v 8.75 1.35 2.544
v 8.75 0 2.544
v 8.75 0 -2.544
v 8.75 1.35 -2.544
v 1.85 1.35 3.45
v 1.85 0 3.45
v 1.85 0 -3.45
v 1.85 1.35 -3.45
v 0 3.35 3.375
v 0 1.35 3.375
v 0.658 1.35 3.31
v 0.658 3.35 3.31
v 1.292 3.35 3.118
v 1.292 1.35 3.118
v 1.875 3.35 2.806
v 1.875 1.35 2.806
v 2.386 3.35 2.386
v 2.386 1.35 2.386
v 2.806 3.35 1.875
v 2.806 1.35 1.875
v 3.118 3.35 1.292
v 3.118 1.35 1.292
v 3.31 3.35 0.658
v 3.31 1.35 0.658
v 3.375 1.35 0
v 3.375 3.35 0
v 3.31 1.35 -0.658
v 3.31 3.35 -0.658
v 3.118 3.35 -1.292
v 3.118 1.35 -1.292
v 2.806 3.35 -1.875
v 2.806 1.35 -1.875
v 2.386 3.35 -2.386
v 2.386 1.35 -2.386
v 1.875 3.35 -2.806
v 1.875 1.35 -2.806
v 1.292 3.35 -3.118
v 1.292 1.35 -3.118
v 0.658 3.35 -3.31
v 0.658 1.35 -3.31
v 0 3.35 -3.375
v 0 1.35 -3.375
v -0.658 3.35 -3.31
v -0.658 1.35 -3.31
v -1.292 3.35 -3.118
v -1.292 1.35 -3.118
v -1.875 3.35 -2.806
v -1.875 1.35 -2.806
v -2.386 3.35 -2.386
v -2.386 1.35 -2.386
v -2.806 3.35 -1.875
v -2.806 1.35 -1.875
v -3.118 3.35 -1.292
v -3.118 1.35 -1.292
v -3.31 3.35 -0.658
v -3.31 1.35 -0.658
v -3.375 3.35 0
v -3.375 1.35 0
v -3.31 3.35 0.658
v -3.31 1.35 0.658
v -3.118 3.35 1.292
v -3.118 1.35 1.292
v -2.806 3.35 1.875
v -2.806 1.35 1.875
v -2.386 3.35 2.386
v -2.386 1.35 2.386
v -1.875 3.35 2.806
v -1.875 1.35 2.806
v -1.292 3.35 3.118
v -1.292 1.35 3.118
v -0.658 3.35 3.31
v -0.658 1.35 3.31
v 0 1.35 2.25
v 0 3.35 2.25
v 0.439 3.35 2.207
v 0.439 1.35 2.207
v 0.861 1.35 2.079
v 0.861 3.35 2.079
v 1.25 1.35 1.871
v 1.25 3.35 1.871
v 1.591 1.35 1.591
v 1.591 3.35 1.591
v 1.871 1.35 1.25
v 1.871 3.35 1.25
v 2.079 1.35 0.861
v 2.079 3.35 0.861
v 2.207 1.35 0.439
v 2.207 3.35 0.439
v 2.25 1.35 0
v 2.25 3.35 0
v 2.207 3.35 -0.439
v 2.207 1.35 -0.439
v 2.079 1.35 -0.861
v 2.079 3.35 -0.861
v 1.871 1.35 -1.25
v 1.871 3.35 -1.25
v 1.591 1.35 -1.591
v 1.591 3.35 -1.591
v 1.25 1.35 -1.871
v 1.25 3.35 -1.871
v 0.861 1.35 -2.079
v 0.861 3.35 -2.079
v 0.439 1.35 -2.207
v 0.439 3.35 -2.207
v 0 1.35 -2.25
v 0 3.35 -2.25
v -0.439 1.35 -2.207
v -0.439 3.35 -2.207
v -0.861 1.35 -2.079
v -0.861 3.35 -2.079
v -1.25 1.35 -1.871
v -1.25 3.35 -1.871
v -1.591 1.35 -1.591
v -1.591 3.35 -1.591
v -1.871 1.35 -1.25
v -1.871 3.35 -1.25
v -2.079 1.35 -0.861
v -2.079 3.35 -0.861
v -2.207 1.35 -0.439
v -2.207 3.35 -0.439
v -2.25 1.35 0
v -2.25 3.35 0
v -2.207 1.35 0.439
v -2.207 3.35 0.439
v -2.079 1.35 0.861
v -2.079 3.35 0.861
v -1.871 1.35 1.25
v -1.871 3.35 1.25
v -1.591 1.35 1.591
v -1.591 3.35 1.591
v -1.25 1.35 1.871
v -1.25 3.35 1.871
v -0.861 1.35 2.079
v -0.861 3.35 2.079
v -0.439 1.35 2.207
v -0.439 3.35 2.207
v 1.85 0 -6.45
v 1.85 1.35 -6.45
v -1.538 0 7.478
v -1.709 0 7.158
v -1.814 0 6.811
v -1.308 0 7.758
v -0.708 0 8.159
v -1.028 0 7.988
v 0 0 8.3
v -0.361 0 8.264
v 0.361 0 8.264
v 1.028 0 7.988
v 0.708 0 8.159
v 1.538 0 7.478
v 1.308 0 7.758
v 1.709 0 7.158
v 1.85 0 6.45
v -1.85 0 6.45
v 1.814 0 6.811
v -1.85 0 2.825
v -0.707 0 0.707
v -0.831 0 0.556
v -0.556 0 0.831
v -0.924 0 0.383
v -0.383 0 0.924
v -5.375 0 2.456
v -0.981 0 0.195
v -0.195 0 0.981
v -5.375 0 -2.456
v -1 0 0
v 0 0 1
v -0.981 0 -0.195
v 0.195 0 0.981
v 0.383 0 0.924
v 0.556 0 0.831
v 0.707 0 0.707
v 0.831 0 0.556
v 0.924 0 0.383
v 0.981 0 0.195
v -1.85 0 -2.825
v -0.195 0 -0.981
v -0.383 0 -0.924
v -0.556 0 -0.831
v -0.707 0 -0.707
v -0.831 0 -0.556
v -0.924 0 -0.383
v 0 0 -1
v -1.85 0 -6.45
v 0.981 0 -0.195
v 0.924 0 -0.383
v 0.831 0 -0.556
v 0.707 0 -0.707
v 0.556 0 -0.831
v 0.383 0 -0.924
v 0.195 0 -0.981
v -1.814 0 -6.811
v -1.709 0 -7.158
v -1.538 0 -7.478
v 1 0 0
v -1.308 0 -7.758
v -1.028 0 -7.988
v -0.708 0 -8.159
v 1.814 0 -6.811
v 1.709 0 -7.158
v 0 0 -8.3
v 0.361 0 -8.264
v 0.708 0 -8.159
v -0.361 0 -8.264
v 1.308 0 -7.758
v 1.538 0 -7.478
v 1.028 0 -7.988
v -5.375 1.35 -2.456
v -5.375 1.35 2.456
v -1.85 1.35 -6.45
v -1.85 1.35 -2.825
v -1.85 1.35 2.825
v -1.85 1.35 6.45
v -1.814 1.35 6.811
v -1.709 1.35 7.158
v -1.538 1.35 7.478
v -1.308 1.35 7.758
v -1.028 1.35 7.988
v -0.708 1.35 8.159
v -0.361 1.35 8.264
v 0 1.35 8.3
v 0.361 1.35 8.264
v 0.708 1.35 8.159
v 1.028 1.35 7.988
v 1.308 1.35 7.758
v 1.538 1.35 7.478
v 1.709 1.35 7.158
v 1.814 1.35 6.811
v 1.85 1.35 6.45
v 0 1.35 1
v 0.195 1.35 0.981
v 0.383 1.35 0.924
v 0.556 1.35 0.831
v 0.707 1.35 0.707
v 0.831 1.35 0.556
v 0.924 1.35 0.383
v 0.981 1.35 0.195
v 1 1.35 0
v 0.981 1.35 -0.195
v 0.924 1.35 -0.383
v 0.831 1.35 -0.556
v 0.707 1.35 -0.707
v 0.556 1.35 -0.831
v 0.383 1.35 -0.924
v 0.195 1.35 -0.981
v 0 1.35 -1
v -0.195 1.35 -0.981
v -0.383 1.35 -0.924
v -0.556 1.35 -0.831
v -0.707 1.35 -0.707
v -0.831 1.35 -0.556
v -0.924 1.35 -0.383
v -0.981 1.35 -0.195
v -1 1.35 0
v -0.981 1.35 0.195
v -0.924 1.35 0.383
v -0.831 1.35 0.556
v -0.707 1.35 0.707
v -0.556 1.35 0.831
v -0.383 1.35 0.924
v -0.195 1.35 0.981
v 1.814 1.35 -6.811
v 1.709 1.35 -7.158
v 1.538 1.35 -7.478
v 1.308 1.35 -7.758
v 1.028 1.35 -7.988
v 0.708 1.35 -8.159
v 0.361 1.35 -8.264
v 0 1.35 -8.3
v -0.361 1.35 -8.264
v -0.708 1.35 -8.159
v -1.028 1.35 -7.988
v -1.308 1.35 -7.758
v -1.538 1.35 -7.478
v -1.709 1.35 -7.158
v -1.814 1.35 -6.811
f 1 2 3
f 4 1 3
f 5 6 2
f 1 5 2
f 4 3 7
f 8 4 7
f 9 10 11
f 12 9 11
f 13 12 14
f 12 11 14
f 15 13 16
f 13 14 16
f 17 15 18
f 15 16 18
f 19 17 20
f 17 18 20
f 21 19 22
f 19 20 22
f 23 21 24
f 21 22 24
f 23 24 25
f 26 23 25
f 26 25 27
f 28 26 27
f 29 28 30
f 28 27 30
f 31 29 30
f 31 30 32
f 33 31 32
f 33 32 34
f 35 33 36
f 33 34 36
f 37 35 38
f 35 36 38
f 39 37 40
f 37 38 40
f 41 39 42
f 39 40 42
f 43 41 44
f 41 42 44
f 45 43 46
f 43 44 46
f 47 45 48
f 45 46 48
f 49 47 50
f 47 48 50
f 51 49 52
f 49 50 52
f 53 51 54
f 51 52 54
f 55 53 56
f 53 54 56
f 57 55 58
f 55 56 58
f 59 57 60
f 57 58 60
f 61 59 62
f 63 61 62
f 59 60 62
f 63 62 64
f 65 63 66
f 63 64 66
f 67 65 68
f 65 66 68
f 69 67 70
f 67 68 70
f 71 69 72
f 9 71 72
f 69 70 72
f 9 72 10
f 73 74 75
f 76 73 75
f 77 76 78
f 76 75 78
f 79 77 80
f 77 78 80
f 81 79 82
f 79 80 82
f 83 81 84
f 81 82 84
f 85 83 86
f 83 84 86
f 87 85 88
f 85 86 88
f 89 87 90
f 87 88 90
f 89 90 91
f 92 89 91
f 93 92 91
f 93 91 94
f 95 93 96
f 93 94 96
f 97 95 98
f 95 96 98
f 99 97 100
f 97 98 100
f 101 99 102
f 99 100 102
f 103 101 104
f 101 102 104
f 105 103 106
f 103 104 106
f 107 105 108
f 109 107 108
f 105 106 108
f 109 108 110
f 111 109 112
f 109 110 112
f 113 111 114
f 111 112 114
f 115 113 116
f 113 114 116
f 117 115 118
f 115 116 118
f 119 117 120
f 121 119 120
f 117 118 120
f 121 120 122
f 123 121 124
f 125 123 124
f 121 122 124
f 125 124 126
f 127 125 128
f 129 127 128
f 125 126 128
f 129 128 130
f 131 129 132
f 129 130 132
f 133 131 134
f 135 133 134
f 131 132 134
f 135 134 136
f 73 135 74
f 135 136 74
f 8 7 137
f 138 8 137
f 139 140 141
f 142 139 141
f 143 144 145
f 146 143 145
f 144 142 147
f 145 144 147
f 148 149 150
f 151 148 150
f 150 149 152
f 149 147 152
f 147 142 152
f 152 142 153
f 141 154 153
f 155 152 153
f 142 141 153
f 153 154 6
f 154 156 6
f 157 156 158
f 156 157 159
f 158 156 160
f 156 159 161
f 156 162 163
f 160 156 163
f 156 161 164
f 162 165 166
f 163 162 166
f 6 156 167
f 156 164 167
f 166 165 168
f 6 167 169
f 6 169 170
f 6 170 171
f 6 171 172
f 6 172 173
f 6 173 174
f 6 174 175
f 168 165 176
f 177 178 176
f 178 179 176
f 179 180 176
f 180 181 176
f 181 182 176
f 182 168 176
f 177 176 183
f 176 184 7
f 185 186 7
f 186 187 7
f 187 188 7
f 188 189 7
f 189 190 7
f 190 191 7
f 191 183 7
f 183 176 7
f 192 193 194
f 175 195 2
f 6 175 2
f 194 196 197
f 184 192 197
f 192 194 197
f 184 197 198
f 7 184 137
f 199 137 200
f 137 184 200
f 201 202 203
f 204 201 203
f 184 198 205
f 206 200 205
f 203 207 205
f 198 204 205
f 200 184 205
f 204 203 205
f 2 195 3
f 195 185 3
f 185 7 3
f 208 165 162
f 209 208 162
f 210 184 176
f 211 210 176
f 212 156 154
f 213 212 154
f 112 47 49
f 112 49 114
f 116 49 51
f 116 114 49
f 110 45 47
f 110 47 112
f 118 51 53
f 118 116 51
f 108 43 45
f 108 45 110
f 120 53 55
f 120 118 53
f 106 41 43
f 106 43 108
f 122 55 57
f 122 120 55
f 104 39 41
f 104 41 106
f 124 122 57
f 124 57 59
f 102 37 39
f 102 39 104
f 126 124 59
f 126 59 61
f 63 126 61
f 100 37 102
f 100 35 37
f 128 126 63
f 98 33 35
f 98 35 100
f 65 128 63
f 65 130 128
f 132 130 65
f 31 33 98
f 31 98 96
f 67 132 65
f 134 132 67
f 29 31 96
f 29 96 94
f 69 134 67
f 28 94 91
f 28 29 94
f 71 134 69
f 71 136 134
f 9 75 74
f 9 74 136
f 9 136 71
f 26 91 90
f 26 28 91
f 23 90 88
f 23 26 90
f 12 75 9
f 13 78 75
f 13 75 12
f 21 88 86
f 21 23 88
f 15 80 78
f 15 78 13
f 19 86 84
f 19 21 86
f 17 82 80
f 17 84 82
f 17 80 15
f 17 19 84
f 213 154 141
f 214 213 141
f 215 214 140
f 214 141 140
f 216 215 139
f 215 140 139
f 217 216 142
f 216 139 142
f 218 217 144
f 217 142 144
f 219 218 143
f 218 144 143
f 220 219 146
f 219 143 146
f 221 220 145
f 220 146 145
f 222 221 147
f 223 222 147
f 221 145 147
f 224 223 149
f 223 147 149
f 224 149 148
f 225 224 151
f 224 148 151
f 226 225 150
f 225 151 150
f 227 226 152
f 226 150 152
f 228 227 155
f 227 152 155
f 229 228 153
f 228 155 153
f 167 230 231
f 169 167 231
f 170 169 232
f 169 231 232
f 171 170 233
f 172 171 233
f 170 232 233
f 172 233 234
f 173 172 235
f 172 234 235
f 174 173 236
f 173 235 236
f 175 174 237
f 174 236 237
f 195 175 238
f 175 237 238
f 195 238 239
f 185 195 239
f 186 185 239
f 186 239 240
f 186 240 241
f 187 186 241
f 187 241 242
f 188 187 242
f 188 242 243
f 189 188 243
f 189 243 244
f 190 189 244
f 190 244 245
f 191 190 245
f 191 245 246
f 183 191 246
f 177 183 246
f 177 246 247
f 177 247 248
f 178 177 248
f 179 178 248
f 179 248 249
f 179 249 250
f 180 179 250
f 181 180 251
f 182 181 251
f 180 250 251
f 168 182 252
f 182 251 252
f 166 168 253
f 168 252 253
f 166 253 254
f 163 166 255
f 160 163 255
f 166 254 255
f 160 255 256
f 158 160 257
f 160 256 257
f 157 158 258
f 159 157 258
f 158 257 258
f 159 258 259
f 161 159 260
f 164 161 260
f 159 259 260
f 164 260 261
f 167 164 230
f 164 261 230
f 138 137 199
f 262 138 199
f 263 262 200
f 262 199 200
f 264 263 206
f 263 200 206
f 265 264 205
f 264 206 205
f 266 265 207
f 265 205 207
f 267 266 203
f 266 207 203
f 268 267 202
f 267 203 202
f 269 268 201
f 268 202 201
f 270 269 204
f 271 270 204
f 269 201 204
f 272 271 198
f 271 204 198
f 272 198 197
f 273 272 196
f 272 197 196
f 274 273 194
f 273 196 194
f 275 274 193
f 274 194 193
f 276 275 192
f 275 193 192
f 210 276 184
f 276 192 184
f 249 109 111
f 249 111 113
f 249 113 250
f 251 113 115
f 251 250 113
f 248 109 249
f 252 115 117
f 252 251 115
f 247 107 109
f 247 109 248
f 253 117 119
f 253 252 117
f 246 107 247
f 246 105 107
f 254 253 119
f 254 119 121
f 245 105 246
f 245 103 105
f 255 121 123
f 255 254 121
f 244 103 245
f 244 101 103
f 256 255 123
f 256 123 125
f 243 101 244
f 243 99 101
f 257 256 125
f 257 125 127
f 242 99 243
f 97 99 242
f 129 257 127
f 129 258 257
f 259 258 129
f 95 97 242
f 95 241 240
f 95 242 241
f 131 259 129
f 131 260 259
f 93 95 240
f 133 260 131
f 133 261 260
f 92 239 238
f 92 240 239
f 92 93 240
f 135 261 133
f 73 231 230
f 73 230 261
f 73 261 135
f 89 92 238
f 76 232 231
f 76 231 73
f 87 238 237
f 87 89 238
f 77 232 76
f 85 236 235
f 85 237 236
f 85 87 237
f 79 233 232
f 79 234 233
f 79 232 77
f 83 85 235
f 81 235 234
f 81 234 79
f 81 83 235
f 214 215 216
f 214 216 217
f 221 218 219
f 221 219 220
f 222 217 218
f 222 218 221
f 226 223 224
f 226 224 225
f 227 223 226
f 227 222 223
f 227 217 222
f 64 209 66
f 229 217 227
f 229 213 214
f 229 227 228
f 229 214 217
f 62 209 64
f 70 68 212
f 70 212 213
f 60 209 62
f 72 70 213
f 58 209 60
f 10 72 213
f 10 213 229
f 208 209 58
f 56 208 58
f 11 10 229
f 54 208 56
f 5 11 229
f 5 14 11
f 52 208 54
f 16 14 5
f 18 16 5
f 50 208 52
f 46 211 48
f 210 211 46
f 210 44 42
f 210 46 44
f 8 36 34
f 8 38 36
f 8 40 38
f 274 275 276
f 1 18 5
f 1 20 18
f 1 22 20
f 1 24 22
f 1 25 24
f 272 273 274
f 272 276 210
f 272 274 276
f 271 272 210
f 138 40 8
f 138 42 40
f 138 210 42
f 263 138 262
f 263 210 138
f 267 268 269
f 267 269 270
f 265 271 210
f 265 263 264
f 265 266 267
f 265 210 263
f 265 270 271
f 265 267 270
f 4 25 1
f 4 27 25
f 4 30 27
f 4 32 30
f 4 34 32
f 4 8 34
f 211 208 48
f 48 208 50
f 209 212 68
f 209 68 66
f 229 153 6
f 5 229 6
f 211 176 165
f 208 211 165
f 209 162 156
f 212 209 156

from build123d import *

# Parameters (mm, degrees)
ESTRUSIONE_ESTRUSIONE1_DEPTH = 1.35
SCHIZZO2_R                   = 3.375
ESTRUSIONE_ESTRUSIONE2_DEPTH = 2
SCHIZZO3_R                   = 2.25
TAGLIO_ESTRUSIONE1_DEPTH     = 2
SCHIZZO4_R                   = 1
TAGLIO_ESTRUSIONE2_DEPTH     = 13.225076687


with BuildPart() as part:
    # Schizzo1 → Estrusione-Estrusione1 (new body)
    with BuildSketch(Plane(origin=(0, 0, 0), x_dir=(1, 0, 0), z_dir=(0, 1, 0))):
        with BuildLine():
            ThreePointArc((1.85, 6.45), (0, 8.3), (-1.85, 6.45))
            Line((-1.85, 6.45), (-1.85, 2.824645909))
            Line((-1.85, 2.824645909), (-5.375, 2.455525211))
            Line((-5.375, 2.455525211), (-5.375, -2.455525211))
            Line((-5.375, -2.455525211), (-1.85, -2.824645909))
            Line((-1.85, -2.824645909), (-1.85, -6.45))
            ThreePointArc((-1.85, -6.45), (0, -8.3), (1.85, -6.45))
            Line((1.85, -6.45), (1.85, -3.45))
            Line((1.85, -3.45), (8.75, -2.543939394))
            Line((8.75, -2.543939394), (8.75, 2.543939394))
            Line((8.75, 2.543939394), (1.85, 3.45))
            Line((1.85, 3.45), (1.85, 6.45))
        make_face()
    extrude(amount=ESTRUSIONE_ESTRUSIONE1_DEPTH)

    # Schizzo2 → Estrusione-Estrusione2 (add)
    with BuildSketch(Plane(origin=(0, 1.35, 0), x_dir=(1, 0, 0), z_dir=(0, 1, 0))):
        with Locations(Location((0, 0, 0), (0, 0, 270))):
            Circle(SCHIZZO2_R)
    extrude(amount=ESTRUSIONE_ESTRUSIONE2_DEPTH)

    # Schizzo3 → Taglio-Estrusione1 (cut)
    with BuildSketch(Plane(origin=(0, 3.35, 0), x_dir=(1, 0, 0), z_dir=(0, 1, 0))):
        with Locations(Location((0, 0, 0), (0, 0, 270))):
            Circle(SCHIZZO3_R)
    extrude(amount=-TAGLIO_ESTRUSIONE1_DEPTH, mode=Mode.SUBTRACT)

    # Schizzo4 → Taglio-Estrusione2 (cut, through all)
    with BuildSketch(Plane(origin=(0, 1.35, 0), x_dir=(1, 0, 0), z_dir=(0, 1, 0))):
        with Locations(Location((0, 0, 0), (0, 0, 270))):
            Circle(SCHIZZO4_R)
    extrude(amount=-TAGLIO_ESTRUSIONE2_DEPTH, mode=Mode.SUBTRACT)


solid = part.part
